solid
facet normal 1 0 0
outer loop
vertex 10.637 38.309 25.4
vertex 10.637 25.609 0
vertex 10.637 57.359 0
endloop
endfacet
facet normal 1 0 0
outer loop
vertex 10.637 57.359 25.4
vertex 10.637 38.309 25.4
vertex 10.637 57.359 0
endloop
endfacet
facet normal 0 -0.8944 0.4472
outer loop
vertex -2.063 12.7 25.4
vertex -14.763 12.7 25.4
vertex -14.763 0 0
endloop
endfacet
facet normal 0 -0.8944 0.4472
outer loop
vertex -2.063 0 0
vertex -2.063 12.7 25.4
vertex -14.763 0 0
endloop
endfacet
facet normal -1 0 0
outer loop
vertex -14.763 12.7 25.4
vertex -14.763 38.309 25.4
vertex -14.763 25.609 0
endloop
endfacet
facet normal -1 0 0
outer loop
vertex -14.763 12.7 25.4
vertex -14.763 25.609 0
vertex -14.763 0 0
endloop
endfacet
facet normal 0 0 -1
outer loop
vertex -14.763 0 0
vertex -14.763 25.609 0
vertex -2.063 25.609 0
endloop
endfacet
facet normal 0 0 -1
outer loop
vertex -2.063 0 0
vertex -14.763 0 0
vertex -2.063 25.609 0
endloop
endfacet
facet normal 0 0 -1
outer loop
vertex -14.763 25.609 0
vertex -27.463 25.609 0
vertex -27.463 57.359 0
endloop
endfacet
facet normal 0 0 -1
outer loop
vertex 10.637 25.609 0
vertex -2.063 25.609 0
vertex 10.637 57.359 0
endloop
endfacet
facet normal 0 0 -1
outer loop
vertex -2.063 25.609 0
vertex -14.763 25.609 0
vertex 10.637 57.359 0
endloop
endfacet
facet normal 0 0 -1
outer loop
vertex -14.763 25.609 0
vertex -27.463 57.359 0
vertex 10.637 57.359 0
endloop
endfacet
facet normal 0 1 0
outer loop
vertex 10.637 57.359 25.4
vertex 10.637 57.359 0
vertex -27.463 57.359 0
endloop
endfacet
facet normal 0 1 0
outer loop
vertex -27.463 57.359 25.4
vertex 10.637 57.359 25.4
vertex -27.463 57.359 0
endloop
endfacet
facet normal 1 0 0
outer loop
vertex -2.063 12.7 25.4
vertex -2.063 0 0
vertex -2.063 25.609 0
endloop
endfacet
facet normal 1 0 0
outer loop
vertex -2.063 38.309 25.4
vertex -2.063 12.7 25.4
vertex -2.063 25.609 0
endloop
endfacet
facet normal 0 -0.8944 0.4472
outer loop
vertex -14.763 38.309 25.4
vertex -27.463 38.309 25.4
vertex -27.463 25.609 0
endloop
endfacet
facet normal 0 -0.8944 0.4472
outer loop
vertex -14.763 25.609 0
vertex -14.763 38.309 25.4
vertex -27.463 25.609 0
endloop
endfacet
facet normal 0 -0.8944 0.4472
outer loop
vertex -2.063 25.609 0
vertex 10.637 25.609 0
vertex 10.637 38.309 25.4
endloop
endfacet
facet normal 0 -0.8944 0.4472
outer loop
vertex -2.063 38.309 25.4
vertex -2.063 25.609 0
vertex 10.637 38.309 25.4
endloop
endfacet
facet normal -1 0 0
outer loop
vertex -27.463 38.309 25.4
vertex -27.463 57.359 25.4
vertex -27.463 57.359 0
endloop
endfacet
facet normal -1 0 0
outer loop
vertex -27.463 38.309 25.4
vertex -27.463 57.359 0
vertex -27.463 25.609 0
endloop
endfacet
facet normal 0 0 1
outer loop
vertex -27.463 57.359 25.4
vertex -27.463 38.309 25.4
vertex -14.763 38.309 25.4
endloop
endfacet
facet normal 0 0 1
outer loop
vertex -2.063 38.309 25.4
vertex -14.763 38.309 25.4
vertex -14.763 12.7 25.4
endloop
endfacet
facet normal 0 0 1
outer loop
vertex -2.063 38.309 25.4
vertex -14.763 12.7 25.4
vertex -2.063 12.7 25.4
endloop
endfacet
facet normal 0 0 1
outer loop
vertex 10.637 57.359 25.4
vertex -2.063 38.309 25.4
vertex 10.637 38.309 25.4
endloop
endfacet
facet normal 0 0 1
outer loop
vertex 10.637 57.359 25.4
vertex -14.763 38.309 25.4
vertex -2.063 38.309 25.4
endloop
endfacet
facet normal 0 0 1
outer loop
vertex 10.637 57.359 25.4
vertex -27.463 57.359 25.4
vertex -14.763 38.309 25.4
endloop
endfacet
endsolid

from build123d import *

# Parameters (mm, degrees)
F1_DEPTH = 25.4
F3_DEPTH = 12.7
F5_DEPTH = 12.7
F7_DEPTH = 12.7


with BuildPart() as f1:
    # F0 (on Top) → F1 (new body)
    with BuildSketch(Plane.XY):
        Polygon((10.637409, 57.358576), (0, 57.358576), (-27.462591, 57.358576), (-27.462591, 25.608576), (-14.762591, 25.608576), (-14.762591, 0), (-2.062591, 0), (-2.062591, 25.608576), (10.637409, 25.608576), align=None)
    extrude(amount=F1_DEPTH)

    # F2 (on face) → F3 (cut)
    with BuildSketch(Plane(origin=(-27.462591, 0, 0), x_dir=(0, -1, 0), z_dir=(-1, 0, 0))):
        Polygon((-25.608576, 25.4), (-38.308576, 25.4), (-25.608576, 0), align=None)
    extrude(amount=-F3_DEPTH, mode=Mode.SUBTRACT)

    # F4 (on face) → F5 (cut)
    with BuildSketch(Plane.YZ.offset(10.637409)):
        Polygon((25.608576, 25.4), (25.608576, 0), (38.308576, 25.4), align=None)
    extrude(amount=-F5_DEPTH, mode=Mode.SUBTRACT)

    # F6 (on face) → F7 (cut)
    with BuildSketch(Plane(origin=(-14.762591, 0, 0), x_dir=(0, -1, 0), z_dir=(-1, 0, 0))):
        Polygon((0, 25.4), (-12.7, 25.4), (0, 0), align=None)
    extrude(amount=-F7_DEPTH, mode=Mode.SUBTRACT)


solid = f1.part
